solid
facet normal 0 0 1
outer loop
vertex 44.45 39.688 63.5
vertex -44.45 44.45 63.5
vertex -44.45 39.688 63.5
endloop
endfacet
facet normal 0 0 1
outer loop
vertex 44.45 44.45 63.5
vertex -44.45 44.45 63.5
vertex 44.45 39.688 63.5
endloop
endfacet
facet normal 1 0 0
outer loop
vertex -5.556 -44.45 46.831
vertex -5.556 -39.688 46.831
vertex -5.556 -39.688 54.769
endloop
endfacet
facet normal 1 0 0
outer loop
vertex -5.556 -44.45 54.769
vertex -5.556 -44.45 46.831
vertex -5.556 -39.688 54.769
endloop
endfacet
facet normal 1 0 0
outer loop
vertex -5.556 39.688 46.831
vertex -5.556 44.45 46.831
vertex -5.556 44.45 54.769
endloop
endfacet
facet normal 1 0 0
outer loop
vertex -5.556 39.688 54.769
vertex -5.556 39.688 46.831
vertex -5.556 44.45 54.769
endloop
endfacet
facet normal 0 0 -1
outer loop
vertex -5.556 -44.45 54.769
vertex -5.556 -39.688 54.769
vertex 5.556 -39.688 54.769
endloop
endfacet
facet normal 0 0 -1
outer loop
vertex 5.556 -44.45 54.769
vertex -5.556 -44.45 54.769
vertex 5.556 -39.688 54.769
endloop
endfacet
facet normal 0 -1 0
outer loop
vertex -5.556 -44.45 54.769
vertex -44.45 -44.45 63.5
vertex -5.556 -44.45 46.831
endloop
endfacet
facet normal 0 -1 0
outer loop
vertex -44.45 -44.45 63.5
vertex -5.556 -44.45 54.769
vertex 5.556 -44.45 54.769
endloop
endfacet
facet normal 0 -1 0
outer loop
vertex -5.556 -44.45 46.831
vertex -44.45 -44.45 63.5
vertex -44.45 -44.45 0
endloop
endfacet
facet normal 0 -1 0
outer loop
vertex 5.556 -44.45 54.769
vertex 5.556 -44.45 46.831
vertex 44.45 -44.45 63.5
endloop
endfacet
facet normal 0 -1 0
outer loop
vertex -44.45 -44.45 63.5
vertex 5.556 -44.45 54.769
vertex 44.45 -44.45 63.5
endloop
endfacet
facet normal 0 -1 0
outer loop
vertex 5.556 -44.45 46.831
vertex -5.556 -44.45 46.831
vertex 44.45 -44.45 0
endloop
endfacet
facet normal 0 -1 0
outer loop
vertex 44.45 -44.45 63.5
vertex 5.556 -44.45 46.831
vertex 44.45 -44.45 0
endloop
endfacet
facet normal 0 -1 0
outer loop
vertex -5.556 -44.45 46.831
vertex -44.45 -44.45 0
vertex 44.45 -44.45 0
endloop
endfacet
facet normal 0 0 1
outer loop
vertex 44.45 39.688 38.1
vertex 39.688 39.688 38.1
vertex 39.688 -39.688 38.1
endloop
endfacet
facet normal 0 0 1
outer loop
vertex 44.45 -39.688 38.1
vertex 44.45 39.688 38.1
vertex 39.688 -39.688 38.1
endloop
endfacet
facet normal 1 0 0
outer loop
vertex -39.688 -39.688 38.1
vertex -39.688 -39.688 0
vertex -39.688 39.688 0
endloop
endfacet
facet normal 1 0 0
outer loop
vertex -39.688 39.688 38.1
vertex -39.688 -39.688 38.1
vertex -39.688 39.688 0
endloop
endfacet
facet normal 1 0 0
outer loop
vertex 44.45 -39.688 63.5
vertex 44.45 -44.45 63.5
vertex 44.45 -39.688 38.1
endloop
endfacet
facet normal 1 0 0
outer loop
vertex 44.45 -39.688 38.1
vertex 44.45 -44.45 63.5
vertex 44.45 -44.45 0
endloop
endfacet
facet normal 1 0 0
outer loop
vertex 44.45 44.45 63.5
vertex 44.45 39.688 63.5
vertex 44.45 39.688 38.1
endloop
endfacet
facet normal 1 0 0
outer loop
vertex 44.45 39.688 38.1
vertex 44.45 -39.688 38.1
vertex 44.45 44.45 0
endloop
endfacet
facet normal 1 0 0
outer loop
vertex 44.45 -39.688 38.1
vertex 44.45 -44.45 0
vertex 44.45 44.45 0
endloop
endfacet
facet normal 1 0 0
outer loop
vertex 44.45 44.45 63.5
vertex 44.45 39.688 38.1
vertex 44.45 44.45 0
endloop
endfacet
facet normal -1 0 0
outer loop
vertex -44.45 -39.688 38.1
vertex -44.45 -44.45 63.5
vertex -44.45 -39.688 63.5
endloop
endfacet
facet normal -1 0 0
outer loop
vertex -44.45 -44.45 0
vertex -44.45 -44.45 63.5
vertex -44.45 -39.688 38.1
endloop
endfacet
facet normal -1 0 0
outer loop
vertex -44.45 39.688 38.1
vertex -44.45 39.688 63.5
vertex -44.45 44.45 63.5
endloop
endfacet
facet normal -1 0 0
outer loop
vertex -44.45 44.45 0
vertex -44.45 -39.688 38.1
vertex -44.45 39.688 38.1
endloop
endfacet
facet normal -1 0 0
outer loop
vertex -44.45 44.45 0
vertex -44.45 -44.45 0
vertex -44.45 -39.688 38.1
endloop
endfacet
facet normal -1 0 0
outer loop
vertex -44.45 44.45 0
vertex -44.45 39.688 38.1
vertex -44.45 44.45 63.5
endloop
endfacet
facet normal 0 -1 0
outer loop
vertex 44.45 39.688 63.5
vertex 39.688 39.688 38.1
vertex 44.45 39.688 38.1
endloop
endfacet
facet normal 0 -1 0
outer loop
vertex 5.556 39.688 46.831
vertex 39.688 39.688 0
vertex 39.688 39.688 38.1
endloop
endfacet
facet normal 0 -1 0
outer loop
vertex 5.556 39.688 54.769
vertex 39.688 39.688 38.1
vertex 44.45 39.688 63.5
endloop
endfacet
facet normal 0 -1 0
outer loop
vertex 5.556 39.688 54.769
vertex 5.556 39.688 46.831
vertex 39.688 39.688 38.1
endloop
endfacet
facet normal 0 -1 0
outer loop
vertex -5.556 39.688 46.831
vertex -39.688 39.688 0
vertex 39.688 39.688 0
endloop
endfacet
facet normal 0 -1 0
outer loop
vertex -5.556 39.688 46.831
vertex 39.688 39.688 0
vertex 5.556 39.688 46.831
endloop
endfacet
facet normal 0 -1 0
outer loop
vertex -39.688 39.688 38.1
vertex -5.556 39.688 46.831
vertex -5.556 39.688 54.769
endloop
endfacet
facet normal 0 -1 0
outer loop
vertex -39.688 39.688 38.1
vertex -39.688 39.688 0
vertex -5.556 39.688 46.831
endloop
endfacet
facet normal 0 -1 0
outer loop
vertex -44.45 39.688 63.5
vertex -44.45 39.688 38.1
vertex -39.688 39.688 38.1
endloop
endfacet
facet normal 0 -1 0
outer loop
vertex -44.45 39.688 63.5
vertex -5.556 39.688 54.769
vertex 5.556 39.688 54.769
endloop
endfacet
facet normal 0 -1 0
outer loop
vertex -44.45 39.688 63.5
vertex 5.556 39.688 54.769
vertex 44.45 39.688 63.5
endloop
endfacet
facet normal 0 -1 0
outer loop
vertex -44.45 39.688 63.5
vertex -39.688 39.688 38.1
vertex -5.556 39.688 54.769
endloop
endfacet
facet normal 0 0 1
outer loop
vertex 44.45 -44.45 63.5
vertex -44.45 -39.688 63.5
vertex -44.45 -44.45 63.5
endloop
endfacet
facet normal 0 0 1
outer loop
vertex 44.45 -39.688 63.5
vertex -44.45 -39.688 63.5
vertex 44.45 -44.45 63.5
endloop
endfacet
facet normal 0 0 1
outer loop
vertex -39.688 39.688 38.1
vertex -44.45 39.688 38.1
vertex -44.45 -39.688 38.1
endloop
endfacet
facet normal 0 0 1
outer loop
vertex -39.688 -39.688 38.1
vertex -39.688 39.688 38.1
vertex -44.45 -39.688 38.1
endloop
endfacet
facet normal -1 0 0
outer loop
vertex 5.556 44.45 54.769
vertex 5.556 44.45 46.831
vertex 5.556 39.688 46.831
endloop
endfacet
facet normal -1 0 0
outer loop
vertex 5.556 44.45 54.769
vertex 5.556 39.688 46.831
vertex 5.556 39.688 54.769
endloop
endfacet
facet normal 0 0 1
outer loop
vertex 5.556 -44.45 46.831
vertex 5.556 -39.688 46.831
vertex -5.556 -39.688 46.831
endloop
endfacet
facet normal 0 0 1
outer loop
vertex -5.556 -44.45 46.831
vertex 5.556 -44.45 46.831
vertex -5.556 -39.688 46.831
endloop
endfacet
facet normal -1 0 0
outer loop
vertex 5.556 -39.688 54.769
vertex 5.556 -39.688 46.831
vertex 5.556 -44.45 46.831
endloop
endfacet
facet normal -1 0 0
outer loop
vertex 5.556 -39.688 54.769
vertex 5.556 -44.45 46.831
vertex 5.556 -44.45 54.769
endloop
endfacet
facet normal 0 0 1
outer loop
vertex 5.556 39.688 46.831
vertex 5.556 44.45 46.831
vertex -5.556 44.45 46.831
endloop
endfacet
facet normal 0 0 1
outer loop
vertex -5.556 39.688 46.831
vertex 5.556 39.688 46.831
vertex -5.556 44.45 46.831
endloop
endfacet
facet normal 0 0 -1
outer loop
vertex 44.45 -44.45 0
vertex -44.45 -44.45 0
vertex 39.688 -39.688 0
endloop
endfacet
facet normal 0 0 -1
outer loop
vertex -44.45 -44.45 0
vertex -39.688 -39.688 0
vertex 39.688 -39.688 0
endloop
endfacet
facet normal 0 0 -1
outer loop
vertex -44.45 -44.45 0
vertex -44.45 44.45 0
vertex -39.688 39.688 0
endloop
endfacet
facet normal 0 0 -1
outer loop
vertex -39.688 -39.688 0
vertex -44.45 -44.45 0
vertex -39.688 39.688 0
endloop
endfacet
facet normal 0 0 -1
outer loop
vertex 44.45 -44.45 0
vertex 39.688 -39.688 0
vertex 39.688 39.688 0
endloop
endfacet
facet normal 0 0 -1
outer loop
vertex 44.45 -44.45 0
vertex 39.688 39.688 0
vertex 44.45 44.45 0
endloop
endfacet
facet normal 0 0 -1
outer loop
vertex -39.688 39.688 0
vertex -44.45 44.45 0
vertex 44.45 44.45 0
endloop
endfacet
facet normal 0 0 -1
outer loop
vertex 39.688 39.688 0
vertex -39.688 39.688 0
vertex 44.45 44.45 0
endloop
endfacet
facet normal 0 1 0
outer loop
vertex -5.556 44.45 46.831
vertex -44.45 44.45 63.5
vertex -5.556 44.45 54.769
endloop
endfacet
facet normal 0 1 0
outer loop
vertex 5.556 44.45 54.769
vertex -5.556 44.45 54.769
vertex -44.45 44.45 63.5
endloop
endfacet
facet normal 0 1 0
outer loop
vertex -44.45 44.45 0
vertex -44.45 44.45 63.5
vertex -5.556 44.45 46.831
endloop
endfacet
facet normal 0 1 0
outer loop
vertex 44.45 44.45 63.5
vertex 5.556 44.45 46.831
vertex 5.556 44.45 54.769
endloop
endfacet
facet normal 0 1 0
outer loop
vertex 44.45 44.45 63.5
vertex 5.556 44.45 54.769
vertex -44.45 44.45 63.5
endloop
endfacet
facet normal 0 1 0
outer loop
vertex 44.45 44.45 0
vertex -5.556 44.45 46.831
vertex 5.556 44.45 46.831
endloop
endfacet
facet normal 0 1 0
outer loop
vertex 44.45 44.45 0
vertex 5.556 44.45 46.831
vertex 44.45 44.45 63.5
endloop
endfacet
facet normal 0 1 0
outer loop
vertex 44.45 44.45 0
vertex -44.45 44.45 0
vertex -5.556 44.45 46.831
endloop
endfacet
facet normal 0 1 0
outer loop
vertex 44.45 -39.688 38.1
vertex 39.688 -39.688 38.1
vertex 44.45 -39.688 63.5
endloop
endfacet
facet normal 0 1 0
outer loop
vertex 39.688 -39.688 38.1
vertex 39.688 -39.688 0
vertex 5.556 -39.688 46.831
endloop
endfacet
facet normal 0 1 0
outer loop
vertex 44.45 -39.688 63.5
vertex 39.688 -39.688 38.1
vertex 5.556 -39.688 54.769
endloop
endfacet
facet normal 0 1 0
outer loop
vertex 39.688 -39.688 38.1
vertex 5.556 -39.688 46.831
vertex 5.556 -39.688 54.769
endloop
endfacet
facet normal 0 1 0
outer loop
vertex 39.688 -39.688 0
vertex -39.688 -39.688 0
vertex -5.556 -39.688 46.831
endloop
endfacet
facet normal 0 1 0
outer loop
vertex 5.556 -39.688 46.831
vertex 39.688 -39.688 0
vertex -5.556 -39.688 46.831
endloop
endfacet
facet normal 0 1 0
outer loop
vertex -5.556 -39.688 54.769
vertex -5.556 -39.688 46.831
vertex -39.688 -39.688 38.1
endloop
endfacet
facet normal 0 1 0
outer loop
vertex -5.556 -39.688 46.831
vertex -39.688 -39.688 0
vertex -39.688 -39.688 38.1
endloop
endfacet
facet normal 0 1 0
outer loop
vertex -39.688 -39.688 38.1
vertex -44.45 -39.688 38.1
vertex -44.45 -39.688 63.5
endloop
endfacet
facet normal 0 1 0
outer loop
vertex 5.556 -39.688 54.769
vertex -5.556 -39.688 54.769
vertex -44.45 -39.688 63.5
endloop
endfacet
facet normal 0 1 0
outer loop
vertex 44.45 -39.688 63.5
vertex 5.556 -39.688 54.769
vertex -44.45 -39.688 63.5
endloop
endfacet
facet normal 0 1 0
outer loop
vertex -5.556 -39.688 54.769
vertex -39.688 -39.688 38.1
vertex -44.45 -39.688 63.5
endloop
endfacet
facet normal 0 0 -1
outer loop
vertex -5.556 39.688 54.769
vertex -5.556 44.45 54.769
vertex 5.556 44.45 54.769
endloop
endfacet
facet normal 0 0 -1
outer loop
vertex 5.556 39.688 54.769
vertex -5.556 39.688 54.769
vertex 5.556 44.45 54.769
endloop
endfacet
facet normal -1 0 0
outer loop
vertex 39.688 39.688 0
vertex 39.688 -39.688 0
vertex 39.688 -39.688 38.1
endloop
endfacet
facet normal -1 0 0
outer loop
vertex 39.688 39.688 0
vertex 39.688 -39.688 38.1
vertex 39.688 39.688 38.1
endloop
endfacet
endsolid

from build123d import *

# Parameters (mm, degrees)
F0_W     = 88.9
F0_H     = 88.9
F0_W_2   = 79.375
F0_H_2   = 79.375
F1_DEPTH = 63.5
F3_W     = 5.55625
F3_H     = 7.9375
F4_DEPTH = 88.901
F2_W     = 79.375
F2_H     = 25.4
F5_DEPTH = 88.901


with BuildPart() as f1:
    # F0 (on Top) → F1 (new body)
    with BuildSketch(Plane.XY):
        Rectangle(F0_W, F0_H)
        Rectangle(F0_W_2, F0_H_2, mode=Mode.SUBTRACT)
    extrude(amount=F1_DEPTH)

    # F3 (on face) → F4 (cut, through all)
    with BuildSketch(Plane(origin=(0, 44.45, 0), x_dir=(-1, 0, 0), z_dir=(0, 1, 0))):
        with Locations((2.778125, 50.8)):
            Rectangle(F3_W, F3_H)
        with Locations((-2.778125, 50.8)):
            Rectangle(F3_W, F3_H)
    extrude(amount=-F4_DEPTH, mode=Mode.SUBTRACT)

    # F2 (on face) → F5 (cut, through all)
    with BuildSketch(Plane(origin=(-44.45, 0, 0), x_dir=(0, -1, 0), z_dir=(-1, 0, 0))):
        with Locations((0, 50.8)):
            Rectangle(F2_W, F2_H)
    extrude(amount=-F5_DEPTH, mode=Mode.SUBTRACT)


solid = f1.part
